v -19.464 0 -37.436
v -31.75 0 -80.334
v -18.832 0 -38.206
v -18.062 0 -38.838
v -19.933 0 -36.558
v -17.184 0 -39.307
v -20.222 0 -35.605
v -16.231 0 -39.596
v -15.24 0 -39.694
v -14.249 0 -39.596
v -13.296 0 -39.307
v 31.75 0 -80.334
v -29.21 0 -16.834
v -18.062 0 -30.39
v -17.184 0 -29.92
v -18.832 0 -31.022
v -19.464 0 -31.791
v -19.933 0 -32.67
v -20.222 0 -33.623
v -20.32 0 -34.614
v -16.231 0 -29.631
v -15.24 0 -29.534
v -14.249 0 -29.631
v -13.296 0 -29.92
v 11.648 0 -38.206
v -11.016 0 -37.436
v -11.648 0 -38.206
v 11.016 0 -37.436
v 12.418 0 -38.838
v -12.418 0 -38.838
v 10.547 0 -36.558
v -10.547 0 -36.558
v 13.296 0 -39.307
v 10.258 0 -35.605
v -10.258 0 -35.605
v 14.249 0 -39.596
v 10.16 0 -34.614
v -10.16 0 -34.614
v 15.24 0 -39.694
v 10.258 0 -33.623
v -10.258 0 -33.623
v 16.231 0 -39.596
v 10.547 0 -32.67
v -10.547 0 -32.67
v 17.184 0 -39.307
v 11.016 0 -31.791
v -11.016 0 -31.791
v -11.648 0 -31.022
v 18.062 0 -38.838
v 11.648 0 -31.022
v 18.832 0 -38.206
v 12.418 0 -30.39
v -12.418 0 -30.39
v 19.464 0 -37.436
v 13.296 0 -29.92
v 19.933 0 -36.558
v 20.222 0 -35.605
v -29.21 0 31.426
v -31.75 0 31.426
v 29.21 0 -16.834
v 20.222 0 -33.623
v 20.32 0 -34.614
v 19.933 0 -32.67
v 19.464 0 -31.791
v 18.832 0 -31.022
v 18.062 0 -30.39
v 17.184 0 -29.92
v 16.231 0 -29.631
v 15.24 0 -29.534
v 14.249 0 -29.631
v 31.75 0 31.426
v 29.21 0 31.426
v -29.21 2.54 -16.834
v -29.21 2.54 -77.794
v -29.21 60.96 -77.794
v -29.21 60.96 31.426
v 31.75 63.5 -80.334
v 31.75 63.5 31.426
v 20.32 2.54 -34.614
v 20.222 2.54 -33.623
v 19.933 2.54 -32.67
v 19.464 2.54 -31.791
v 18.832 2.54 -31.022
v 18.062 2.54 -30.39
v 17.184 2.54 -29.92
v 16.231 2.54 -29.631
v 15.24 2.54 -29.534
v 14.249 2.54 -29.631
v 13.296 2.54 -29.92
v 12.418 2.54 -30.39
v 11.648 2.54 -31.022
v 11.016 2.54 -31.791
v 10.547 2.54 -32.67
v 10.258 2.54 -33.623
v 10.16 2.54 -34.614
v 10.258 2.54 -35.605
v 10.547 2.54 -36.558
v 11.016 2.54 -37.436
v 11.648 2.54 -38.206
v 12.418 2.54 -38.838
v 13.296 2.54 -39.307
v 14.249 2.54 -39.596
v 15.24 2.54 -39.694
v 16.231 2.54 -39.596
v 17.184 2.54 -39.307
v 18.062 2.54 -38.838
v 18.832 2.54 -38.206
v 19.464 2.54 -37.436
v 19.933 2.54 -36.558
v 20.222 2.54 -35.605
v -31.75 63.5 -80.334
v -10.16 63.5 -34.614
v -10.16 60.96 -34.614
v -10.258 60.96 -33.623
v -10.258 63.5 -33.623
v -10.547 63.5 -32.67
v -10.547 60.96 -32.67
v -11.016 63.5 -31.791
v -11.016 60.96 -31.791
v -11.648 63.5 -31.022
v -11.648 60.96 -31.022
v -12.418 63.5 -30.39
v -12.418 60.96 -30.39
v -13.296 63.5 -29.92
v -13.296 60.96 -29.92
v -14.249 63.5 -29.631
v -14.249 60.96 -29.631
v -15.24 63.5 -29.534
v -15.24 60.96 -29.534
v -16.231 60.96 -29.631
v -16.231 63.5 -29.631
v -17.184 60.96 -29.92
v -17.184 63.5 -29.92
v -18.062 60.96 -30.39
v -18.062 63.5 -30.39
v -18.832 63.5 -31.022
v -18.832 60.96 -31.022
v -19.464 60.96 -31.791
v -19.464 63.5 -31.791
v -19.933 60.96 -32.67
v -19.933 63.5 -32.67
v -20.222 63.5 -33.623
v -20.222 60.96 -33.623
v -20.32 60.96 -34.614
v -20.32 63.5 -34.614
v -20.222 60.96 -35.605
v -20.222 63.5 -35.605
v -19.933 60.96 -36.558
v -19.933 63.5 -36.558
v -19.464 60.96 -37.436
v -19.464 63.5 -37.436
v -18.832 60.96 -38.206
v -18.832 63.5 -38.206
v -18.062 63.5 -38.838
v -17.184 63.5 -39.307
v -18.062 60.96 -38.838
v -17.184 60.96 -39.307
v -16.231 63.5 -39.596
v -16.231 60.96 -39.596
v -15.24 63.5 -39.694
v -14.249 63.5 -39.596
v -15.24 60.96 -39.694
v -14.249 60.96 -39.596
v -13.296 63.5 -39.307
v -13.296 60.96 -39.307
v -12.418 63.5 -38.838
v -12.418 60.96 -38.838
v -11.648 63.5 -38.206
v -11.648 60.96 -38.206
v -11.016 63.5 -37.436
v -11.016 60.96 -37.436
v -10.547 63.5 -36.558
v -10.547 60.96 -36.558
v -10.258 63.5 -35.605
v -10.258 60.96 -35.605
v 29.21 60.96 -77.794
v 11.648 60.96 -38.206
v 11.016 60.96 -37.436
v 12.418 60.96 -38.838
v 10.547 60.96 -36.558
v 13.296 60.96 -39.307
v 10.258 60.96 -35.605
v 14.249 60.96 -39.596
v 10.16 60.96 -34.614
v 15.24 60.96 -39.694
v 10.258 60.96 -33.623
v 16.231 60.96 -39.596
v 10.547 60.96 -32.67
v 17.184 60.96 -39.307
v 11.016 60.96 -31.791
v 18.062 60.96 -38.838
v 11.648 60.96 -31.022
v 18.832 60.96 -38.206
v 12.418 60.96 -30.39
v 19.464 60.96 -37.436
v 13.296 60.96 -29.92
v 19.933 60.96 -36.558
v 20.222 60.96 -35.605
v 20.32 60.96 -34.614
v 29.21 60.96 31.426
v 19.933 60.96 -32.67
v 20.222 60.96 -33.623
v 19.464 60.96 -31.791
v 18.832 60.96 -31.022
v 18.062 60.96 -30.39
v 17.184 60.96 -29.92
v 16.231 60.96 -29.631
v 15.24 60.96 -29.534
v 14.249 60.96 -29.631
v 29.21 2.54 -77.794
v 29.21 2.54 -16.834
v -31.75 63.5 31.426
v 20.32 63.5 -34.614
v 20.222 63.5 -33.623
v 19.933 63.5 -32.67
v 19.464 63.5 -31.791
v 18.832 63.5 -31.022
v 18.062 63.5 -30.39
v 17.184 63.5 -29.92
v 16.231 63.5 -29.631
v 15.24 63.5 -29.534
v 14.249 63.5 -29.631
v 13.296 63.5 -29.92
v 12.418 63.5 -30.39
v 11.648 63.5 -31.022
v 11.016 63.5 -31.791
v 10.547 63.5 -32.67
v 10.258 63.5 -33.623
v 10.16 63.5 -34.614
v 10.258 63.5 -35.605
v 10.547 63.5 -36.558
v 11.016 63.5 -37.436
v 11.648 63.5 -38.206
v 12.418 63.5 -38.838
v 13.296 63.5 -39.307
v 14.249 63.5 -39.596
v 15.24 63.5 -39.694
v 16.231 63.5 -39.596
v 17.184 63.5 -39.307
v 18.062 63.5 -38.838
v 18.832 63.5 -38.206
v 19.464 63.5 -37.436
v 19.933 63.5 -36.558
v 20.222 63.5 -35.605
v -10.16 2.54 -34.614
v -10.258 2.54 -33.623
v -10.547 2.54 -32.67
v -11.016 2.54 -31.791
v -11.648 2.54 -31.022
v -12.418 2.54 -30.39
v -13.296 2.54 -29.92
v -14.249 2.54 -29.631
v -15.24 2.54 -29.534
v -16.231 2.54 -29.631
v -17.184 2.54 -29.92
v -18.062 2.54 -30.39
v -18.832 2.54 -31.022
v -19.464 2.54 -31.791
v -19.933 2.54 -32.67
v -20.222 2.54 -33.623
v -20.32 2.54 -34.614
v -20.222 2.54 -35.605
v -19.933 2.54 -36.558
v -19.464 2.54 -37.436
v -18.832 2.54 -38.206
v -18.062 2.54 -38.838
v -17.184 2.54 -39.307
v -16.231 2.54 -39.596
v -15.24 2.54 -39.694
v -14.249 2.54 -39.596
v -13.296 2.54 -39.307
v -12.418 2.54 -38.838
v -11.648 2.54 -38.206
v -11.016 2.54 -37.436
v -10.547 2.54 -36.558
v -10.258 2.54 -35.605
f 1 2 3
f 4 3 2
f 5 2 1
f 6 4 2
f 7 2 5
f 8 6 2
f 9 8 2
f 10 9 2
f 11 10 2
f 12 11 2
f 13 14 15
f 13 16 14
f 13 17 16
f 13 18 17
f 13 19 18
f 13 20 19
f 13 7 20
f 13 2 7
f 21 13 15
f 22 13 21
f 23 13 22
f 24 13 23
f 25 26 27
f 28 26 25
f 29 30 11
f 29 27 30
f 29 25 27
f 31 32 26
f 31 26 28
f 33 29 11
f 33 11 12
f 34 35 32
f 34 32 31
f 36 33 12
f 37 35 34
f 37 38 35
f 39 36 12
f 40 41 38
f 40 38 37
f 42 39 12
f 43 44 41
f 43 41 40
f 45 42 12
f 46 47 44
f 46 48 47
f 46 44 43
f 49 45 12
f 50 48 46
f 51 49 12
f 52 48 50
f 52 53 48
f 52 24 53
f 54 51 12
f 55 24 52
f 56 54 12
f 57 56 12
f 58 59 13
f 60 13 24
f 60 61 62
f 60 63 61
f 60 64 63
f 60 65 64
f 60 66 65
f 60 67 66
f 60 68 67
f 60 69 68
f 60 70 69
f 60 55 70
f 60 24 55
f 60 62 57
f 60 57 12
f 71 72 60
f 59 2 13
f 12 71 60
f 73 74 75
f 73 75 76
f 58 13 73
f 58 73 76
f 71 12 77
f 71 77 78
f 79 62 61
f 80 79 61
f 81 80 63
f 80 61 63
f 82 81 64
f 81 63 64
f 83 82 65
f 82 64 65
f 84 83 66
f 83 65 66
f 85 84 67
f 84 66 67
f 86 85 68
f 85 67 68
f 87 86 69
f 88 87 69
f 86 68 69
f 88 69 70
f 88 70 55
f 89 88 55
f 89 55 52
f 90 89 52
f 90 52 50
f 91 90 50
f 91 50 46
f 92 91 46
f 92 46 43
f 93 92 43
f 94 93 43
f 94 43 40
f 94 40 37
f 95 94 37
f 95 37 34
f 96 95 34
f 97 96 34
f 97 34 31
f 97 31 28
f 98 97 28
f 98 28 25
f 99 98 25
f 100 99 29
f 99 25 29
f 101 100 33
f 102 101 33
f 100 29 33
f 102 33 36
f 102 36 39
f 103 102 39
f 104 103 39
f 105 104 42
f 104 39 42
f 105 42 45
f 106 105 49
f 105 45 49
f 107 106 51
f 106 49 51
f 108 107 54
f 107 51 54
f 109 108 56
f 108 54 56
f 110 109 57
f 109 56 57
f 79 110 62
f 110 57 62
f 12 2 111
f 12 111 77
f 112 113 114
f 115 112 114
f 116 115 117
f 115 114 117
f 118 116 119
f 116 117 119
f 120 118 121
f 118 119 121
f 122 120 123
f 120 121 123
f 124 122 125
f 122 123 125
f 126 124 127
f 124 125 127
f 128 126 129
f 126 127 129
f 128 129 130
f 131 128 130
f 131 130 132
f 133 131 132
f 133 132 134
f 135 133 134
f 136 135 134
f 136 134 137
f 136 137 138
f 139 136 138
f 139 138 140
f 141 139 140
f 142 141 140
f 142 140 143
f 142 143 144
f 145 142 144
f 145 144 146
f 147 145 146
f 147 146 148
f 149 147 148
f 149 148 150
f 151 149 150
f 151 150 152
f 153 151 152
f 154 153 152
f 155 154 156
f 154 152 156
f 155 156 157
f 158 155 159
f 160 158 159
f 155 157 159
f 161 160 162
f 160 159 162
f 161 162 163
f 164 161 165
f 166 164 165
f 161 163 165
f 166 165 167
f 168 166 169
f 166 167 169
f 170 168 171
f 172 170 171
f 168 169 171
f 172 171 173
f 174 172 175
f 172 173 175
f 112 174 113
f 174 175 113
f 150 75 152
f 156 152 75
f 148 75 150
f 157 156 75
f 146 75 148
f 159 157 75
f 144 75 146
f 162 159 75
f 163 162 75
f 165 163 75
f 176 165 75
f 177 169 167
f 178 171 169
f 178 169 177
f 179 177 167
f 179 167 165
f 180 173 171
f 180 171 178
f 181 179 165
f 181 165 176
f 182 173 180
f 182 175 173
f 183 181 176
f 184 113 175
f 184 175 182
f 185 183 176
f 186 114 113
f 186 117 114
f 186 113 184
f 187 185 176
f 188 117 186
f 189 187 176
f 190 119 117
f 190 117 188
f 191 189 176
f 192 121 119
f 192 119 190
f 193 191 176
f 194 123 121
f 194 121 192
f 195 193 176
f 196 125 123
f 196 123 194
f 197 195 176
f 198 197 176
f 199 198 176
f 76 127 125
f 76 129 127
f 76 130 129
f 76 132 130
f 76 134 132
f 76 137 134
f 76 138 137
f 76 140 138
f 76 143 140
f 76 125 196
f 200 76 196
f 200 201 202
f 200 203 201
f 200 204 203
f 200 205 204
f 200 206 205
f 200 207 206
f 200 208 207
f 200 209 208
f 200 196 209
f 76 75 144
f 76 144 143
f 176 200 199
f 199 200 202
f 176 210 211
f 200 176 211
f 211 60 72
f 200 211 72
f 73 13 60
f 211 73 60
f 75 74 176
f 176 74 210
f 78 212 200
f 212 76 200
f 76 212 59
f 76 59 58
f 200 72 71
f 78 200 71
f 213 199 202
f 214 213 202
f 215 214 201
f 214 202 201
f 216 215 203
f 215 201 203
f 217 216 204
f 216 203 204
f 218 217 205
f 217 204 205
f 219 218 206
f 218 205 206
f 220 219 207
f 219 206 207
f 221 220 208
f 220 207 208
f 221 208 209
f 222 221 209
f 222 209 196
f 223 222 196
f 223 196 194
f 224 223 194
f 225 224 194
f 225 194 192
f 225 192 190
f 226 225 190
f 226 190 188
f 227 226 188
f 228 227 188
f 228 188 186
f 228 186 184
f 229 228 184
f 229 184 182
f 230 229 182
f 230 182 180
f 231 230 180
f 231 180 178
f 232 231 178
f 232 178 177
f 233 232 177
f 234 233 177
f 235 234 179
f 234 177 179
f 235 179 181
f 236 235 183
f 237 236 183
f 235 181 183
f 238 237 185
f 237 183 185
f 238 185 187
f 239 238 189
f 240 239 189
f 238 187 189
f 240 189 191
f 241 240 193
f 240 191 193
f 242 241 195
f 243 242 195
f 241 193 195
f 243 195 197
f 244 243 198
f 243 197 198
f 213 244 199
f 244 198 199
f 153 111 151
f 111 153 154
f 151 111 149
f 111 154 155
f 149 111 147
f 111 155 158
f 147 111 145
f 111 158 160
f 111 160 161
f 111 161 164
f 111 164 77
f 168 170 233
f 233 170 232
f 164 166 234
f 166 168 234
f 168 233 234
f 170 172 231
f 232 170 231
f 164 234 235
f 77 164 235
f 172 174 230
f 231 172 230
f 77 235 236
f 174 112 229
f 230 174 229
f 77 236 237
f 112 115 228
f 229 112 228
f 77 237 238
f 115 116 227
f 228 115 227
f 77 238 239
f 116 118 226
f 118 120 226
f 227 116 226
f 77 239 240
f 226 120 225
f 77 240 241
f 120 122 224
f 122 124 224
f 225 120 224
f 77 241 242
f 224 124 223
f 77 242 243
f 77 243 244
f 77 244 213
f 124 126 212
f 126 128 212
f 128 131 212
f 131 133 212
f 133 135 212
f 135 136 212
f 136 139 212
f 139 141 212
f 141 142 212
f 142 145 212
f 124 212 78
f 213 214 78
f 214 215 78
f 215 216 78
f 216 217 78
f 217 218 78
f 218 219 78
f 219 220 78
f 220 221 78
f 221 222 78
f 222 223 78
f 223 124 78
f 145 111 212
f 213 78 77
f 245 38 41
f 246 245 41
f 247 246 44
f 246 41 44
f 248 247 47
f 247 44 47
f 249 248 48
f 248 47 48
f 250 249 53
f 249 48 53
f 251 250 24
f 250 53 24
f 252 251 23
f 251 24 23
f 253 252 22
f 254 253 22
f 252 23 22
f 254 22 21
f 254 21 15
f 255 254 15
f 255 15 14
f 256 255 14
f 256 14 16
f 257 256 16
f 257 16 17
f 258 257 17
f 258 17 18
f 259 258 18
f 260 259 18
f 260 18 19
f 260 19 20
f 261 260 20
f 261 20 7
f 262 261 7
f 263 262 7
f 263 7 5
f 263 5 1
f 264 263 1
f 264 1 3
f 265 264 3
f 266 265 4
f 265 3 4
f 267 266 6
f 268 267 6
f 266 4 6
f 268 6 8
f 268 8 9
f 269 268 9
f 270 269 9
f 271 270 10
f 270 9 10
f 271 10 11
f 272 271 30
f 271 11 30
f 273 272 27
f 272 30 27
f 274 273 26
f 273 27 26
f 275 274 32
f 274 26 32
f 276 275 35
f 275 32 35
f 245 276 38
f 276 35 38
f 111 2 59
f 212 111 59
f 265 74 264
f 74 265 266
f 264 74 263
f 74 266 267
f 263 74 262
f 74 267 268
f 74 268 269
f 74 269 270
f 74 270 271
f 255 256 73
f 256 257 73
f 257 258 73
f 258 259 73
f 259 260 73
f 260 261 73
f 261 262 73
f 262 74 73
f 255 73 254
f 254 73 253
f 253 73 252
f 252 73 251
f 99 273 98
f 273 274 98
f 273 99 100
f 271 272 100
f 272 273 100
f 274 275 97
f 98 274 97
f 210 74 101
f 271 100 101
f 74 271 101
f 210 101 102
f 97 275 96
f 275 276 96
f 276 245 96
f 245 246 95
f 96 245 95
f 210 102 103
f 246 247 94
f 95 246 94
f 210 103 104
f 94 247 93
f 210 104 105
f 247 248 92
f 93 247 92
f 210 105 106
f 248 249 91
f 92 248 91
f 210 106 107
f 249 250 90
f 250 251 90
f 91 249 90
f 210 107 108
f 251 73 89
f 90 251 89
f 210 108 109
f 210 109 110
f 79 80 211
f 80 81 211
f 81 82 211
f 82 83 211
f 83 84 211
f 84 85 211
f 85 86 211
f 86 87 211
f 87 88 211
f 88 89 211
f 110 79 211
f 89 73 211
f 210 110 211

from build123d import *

# Parameters (mm, degrees)
F0_W     = 63.5
F0_H     = 111.76
F1_DEPTH = 63.5
F3_T     = -2.54
F2_W     = 58.42
F2_H     = 48.26
F4_DEPTH = 25.4
F5_R     = 5.08
F6_DEPTH = 254


with BuildPart() as f1:
    # F0 (on Front) → F1 (new body)
    with BuildSketch(Plane.XZ):
        with Locations((0, -24.453788)):
            Rectangle(F0_W, F0_H)
    extrude(amount=-F1_DEPTH)

    # F3
    f3_openings = [f1.faces().sort_by_distance(p)[0] for p in [
        (0, 31.75, 31.426212),
    ]]
    offset(amount=F3_T, openings=f3_openings)

    # F2 (on face) → F4 (cut)
    with BuildSketch(Plane.XZ):
        with Locations((0, 7.296212)):
            Rectangle(F2_W, F2_H)
    extrude(amount=-F4_DEPTH, mode=Mode.SUBTRACT)

    # F5 (on face) → F6 (cut)
    with BuildSketch(Plane.XZ):
        with Locations((-15.24, -34.613788)):
            Circle(F5_R)
        with Locations((15.24, -34.613788)):
            Circle(F5_R)
    extrude(amount=-F6_DEPTH, mode=Mode.SUBTRACT)


solid = f1.part
